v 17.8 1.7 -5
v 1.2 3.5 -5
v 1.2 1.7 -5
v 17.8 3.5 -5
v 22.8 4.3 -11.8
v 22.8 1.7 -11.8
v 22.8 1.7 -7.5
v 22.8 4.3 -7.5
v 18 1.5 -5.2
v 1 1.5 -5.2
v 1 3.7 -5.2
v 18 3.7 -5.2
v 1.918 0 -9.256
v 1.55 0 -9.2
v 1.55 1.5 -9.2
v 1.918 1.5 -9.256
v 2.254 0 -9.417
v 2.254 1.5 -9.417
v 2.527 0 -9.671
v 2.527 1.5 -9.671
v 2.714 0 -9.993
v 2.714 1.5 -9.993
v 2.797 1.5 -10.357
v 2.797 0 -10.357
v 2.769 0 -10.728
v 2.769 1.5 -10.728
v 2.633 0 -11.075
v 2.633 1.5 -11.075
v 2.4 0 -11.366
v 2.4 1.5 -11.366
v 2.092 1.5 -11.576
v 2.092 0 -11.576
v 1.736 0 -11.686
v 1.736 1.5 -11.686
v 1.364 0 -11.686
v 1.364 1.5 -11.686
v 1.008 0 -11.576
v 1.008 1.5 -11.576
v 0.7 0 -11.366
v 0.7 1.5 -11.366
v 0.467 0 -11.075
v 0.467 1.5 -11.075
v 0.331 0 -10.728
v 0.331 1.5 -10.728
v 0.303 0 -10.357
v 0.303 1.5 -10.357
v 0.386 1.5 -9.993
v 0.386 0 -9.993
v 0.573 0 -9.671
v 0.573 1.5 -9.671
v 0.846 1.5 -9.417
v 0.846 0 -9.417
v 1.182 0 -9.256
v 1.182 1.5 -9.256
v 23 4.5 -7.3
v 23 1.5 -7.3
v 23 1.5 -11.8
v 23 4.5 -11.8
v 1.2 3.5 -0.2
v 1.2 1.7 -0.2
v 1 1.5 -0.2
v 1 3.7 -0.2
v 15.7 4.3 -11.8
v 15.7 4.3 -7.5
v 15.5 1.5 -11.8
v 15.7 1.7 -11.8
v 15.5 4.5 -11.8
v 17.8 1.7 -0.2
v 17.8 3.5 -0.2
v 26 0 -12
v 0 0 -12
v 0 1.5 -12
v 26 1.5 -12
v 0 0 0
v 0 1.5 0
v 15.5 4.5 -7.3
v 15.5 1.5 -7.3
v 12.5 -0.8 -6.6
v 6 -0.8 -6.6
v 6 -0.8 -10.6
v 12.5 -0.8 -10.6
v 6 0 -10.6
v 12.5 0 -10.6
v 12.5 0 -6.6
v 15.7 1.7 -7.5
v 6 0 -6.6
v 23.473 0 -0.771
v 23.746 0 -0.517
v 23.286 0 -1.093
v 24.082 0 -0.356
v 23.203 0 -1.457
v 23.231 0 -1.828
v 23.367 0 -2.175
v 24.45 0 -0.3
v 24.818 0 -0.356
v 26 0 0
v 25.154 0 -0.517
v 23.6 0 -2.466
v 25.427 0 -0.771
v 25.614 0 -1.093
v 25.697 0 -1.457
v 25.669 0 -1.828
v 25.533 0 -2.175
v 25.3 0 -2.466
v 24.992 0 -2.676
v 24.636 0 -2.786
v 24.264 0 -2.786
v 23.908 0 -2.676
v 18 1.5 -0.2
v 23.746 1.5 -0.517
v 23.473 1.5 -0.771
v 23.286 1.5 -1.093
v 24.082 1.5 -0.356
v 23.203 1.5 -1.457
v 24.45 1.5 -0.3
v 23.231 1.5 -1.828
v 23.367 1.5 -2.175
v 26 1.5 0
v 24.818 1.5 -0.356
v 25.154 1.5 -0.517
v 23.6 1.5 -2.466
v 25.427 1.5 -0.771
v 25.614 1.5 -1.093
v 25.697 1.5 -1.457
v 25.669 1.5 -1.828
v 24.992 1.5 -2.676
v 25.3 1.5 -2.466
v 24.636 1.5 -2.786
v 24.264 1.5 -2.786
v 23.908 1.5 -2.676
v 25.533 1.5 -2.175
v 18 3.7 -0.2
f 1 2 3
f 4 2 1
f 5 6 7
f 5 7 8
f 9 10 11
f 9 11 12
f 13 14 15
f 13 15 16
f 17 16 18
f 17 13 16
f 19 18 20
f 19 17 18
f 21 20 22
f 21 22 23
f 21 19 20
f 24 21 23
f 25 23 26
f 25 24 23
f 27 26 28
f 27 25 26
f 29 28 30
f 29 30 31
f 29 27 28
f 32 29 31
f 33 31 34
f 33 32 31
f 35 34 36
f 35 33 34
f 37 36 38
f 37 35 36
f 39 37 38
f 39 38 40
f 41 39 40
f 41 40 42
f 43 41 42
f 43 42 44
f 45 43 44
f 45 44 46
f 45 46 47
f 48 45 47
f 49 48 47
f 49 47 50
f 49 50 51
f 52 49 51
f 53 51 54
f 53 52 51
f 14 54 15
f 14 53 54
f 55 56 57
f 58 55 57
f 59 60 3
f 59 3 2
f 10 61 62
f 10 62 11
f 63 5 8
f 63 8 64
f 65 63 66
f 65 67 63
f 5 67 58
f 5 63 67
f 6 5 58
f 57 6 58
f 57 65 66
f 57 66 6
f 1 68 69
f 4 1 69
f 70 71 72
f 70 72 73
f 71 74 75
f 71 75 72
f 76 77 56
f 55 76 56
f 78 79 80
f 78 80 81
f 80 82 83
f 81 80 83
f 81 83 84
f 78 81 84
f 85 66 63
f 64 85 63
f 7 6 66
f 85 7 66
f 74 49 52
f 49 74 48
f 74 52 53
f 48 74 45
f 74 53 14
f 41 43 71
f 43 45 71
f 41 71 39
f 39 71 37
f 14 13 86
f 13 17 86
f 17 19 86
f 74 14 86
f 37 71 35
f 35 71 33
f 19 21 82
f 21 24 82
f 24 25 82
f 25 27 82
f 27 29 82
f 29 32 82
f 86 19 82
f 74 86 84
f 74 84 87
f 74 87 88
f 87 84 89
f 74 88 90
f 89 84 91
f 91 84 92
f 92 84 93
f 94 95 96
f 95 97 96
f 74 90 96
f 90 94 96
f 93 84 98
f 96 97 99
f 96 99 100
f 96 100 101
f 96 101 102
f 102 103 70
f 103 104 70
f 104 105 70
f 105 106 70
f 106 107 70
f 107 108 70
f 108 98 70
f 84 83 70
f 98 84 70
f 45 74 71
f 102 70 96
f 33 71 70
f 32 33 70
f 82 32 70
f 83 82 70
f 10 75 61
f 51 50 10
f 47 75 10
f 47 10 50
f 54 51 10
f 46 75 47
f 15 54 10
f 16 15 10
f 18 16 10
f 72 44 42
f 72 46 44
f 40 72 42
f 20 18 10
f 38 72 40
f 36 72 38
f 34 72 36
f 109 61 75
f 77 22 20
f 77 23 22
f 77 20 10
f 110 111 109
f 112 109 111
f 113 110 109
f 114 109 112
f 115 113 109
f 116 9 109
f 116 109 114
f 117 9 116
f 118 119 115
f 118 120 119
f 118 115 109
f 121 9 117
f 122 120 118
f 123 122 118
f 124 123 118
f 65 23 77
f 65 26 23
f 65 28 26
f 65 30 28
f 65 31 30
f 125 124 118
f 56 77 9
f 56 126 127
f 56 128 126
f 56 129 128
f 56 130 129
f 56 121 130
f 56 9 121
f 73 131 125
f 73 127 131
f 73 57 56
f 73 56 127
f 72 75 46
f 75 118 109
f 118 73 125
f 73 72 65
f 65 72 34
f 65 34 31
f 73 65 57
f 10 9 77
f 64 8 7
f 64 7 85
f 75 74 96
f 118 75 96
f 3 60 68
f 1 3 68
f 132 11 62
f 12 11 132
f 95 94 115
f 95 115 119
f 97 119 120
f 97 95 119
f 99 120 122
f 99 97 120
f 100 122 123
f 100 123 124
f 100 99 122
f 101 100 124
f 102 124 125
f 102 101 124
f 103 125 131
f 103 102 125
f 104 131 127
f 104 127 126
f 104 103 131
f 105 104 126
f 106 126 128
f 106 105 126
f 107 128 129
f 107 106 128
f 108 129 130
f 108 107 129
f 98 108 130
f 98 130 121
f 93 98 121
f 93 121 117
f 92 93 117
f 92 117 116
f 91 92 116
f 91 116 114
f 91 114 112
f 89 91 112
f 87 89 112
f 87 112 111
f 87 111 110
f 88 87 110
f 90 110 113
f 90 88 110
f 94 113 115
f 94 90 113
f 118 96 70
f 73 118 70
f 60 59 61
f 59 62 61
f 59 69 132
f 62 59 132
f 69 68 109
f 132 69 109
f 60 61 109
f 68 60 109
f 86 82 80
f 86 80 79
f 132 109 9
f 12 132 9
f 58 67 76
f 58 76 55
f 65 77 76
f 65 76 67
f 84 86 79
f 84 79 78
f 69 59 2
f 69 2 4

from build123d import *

# Parameters (mm, degrees)
SKETCH1_W           = 26
SKETCH1_H           = 12
SKETCH1_R           = 1.25
BOSS_EXTRUDE1_DEPTH = 1.5
SKETCH2_W           = 17
SKETCH2_H           = 5
BOSS_EXTRUDE2_DEPTH = 2.2
SKETCH2_3_W         = 7.5
SKETCH2_3_H         = 4.5
BOSS_EXTRUDE3_DEPTH = 3
SKETCH3_W           = 7.1
SKETCH3_H           = 2.6
CUT_EXTRUDE1_DEPTH  = 4.3
SKETCH4_W           = 16.6
SKETCH4_H           = 1.8
CUT_EXTRUDE2_DEPTH  = 4.8
SKETCH5_W           = 6.5
SKETCH5_H           = 4
BOSS_EXTRUDE4_DEPTH = 0.8


with BuildPart() as part:
    # Sketch1 → Boss-Extrude1 (new body)
    with BuildSketch(Plane(origin=(0, 0, 0), x_dir=(1, 0, 0), z_dir=(0, 1, 0))):
        with Locations((13, 6)):
            Rectangle(SKETCH1_W, SKETCH1_H)
        with Locations(Location((1.55, 10.45, 0), (0, 0, 270))):
            Circle(SKETCH1_R, mode=Mode.SUBTRACT)
        with Locations(Location((24.45, 1.55, 0), (0, 0, 270))):
            Circle(SKETCH1_R, mode=Mode.SUBTRACT)
    extrude(amount=BOSS_EXTRUDE1_DEPTH)

    # Sketch2 → Boss-Extrude2 (add)
    with BuildSketch(Plane(origin=(0, 1.5, 0), x_dir=(1, 0, 0), z_dir=(0, 1, 0))):
        with Locations((9.5, 2.7)):
            Rectangle(SKETCH2_W, SKETCH2_H)
    extrude(amount=BOSS_EXTRUDE2_DEPTH)

    # Sketch2<3> → Boss-Extrude3 (add)
    with BuildSketch(Plane(origin=(0, 1.5, 0), x_dir=(1, 0, 0), z_dir=(0, 1, 0))):
        with Locations((19.25, 9.55)):
            Rectangle(SKETCH2_3_W, SKETCH2_3_H)
    extrude(amount=BOSS_EXTRUDE3_DEPTH)

    # Sketch3 → Cut-Extrude1 (cut)
    with BuildSketch(Plane(origin=(0, 0, -11.8), x_dir=(-1, 0, 0), z_dir=(0, 0, -1))):
        with Locations((-19.25, 3)):
            Rectangle(SKETCH3_W, SKETCH3_H)
    extrude(amount=-CUT_EXTRUDE1_DEPTH, mode=Mode.SUBTRACT)

    # Sketch4 → Cut-Extrude2 (cut)
    with BuildSketch(Plane.XY.offset(-0.2)):
        with Locations((9.5, 2.6)):
            Rectangle(SKETCH4_W, SKETCH4_H)
    extrude(amount=-CUT_EXTRUDE2_DEPTH, mode=Mode.SUBTRACT)

    # Sketch5 → Boss-Extrude4 (add)
    with BuildSketch(Plane.XZ):
        with Locations((9.25, -8.6)):
            Rectangle(SKETCH5_W, SKETCH5_H)
    extrude(amount=BOSS_EXTRUDE4_DEPTH)


solid = part.part
